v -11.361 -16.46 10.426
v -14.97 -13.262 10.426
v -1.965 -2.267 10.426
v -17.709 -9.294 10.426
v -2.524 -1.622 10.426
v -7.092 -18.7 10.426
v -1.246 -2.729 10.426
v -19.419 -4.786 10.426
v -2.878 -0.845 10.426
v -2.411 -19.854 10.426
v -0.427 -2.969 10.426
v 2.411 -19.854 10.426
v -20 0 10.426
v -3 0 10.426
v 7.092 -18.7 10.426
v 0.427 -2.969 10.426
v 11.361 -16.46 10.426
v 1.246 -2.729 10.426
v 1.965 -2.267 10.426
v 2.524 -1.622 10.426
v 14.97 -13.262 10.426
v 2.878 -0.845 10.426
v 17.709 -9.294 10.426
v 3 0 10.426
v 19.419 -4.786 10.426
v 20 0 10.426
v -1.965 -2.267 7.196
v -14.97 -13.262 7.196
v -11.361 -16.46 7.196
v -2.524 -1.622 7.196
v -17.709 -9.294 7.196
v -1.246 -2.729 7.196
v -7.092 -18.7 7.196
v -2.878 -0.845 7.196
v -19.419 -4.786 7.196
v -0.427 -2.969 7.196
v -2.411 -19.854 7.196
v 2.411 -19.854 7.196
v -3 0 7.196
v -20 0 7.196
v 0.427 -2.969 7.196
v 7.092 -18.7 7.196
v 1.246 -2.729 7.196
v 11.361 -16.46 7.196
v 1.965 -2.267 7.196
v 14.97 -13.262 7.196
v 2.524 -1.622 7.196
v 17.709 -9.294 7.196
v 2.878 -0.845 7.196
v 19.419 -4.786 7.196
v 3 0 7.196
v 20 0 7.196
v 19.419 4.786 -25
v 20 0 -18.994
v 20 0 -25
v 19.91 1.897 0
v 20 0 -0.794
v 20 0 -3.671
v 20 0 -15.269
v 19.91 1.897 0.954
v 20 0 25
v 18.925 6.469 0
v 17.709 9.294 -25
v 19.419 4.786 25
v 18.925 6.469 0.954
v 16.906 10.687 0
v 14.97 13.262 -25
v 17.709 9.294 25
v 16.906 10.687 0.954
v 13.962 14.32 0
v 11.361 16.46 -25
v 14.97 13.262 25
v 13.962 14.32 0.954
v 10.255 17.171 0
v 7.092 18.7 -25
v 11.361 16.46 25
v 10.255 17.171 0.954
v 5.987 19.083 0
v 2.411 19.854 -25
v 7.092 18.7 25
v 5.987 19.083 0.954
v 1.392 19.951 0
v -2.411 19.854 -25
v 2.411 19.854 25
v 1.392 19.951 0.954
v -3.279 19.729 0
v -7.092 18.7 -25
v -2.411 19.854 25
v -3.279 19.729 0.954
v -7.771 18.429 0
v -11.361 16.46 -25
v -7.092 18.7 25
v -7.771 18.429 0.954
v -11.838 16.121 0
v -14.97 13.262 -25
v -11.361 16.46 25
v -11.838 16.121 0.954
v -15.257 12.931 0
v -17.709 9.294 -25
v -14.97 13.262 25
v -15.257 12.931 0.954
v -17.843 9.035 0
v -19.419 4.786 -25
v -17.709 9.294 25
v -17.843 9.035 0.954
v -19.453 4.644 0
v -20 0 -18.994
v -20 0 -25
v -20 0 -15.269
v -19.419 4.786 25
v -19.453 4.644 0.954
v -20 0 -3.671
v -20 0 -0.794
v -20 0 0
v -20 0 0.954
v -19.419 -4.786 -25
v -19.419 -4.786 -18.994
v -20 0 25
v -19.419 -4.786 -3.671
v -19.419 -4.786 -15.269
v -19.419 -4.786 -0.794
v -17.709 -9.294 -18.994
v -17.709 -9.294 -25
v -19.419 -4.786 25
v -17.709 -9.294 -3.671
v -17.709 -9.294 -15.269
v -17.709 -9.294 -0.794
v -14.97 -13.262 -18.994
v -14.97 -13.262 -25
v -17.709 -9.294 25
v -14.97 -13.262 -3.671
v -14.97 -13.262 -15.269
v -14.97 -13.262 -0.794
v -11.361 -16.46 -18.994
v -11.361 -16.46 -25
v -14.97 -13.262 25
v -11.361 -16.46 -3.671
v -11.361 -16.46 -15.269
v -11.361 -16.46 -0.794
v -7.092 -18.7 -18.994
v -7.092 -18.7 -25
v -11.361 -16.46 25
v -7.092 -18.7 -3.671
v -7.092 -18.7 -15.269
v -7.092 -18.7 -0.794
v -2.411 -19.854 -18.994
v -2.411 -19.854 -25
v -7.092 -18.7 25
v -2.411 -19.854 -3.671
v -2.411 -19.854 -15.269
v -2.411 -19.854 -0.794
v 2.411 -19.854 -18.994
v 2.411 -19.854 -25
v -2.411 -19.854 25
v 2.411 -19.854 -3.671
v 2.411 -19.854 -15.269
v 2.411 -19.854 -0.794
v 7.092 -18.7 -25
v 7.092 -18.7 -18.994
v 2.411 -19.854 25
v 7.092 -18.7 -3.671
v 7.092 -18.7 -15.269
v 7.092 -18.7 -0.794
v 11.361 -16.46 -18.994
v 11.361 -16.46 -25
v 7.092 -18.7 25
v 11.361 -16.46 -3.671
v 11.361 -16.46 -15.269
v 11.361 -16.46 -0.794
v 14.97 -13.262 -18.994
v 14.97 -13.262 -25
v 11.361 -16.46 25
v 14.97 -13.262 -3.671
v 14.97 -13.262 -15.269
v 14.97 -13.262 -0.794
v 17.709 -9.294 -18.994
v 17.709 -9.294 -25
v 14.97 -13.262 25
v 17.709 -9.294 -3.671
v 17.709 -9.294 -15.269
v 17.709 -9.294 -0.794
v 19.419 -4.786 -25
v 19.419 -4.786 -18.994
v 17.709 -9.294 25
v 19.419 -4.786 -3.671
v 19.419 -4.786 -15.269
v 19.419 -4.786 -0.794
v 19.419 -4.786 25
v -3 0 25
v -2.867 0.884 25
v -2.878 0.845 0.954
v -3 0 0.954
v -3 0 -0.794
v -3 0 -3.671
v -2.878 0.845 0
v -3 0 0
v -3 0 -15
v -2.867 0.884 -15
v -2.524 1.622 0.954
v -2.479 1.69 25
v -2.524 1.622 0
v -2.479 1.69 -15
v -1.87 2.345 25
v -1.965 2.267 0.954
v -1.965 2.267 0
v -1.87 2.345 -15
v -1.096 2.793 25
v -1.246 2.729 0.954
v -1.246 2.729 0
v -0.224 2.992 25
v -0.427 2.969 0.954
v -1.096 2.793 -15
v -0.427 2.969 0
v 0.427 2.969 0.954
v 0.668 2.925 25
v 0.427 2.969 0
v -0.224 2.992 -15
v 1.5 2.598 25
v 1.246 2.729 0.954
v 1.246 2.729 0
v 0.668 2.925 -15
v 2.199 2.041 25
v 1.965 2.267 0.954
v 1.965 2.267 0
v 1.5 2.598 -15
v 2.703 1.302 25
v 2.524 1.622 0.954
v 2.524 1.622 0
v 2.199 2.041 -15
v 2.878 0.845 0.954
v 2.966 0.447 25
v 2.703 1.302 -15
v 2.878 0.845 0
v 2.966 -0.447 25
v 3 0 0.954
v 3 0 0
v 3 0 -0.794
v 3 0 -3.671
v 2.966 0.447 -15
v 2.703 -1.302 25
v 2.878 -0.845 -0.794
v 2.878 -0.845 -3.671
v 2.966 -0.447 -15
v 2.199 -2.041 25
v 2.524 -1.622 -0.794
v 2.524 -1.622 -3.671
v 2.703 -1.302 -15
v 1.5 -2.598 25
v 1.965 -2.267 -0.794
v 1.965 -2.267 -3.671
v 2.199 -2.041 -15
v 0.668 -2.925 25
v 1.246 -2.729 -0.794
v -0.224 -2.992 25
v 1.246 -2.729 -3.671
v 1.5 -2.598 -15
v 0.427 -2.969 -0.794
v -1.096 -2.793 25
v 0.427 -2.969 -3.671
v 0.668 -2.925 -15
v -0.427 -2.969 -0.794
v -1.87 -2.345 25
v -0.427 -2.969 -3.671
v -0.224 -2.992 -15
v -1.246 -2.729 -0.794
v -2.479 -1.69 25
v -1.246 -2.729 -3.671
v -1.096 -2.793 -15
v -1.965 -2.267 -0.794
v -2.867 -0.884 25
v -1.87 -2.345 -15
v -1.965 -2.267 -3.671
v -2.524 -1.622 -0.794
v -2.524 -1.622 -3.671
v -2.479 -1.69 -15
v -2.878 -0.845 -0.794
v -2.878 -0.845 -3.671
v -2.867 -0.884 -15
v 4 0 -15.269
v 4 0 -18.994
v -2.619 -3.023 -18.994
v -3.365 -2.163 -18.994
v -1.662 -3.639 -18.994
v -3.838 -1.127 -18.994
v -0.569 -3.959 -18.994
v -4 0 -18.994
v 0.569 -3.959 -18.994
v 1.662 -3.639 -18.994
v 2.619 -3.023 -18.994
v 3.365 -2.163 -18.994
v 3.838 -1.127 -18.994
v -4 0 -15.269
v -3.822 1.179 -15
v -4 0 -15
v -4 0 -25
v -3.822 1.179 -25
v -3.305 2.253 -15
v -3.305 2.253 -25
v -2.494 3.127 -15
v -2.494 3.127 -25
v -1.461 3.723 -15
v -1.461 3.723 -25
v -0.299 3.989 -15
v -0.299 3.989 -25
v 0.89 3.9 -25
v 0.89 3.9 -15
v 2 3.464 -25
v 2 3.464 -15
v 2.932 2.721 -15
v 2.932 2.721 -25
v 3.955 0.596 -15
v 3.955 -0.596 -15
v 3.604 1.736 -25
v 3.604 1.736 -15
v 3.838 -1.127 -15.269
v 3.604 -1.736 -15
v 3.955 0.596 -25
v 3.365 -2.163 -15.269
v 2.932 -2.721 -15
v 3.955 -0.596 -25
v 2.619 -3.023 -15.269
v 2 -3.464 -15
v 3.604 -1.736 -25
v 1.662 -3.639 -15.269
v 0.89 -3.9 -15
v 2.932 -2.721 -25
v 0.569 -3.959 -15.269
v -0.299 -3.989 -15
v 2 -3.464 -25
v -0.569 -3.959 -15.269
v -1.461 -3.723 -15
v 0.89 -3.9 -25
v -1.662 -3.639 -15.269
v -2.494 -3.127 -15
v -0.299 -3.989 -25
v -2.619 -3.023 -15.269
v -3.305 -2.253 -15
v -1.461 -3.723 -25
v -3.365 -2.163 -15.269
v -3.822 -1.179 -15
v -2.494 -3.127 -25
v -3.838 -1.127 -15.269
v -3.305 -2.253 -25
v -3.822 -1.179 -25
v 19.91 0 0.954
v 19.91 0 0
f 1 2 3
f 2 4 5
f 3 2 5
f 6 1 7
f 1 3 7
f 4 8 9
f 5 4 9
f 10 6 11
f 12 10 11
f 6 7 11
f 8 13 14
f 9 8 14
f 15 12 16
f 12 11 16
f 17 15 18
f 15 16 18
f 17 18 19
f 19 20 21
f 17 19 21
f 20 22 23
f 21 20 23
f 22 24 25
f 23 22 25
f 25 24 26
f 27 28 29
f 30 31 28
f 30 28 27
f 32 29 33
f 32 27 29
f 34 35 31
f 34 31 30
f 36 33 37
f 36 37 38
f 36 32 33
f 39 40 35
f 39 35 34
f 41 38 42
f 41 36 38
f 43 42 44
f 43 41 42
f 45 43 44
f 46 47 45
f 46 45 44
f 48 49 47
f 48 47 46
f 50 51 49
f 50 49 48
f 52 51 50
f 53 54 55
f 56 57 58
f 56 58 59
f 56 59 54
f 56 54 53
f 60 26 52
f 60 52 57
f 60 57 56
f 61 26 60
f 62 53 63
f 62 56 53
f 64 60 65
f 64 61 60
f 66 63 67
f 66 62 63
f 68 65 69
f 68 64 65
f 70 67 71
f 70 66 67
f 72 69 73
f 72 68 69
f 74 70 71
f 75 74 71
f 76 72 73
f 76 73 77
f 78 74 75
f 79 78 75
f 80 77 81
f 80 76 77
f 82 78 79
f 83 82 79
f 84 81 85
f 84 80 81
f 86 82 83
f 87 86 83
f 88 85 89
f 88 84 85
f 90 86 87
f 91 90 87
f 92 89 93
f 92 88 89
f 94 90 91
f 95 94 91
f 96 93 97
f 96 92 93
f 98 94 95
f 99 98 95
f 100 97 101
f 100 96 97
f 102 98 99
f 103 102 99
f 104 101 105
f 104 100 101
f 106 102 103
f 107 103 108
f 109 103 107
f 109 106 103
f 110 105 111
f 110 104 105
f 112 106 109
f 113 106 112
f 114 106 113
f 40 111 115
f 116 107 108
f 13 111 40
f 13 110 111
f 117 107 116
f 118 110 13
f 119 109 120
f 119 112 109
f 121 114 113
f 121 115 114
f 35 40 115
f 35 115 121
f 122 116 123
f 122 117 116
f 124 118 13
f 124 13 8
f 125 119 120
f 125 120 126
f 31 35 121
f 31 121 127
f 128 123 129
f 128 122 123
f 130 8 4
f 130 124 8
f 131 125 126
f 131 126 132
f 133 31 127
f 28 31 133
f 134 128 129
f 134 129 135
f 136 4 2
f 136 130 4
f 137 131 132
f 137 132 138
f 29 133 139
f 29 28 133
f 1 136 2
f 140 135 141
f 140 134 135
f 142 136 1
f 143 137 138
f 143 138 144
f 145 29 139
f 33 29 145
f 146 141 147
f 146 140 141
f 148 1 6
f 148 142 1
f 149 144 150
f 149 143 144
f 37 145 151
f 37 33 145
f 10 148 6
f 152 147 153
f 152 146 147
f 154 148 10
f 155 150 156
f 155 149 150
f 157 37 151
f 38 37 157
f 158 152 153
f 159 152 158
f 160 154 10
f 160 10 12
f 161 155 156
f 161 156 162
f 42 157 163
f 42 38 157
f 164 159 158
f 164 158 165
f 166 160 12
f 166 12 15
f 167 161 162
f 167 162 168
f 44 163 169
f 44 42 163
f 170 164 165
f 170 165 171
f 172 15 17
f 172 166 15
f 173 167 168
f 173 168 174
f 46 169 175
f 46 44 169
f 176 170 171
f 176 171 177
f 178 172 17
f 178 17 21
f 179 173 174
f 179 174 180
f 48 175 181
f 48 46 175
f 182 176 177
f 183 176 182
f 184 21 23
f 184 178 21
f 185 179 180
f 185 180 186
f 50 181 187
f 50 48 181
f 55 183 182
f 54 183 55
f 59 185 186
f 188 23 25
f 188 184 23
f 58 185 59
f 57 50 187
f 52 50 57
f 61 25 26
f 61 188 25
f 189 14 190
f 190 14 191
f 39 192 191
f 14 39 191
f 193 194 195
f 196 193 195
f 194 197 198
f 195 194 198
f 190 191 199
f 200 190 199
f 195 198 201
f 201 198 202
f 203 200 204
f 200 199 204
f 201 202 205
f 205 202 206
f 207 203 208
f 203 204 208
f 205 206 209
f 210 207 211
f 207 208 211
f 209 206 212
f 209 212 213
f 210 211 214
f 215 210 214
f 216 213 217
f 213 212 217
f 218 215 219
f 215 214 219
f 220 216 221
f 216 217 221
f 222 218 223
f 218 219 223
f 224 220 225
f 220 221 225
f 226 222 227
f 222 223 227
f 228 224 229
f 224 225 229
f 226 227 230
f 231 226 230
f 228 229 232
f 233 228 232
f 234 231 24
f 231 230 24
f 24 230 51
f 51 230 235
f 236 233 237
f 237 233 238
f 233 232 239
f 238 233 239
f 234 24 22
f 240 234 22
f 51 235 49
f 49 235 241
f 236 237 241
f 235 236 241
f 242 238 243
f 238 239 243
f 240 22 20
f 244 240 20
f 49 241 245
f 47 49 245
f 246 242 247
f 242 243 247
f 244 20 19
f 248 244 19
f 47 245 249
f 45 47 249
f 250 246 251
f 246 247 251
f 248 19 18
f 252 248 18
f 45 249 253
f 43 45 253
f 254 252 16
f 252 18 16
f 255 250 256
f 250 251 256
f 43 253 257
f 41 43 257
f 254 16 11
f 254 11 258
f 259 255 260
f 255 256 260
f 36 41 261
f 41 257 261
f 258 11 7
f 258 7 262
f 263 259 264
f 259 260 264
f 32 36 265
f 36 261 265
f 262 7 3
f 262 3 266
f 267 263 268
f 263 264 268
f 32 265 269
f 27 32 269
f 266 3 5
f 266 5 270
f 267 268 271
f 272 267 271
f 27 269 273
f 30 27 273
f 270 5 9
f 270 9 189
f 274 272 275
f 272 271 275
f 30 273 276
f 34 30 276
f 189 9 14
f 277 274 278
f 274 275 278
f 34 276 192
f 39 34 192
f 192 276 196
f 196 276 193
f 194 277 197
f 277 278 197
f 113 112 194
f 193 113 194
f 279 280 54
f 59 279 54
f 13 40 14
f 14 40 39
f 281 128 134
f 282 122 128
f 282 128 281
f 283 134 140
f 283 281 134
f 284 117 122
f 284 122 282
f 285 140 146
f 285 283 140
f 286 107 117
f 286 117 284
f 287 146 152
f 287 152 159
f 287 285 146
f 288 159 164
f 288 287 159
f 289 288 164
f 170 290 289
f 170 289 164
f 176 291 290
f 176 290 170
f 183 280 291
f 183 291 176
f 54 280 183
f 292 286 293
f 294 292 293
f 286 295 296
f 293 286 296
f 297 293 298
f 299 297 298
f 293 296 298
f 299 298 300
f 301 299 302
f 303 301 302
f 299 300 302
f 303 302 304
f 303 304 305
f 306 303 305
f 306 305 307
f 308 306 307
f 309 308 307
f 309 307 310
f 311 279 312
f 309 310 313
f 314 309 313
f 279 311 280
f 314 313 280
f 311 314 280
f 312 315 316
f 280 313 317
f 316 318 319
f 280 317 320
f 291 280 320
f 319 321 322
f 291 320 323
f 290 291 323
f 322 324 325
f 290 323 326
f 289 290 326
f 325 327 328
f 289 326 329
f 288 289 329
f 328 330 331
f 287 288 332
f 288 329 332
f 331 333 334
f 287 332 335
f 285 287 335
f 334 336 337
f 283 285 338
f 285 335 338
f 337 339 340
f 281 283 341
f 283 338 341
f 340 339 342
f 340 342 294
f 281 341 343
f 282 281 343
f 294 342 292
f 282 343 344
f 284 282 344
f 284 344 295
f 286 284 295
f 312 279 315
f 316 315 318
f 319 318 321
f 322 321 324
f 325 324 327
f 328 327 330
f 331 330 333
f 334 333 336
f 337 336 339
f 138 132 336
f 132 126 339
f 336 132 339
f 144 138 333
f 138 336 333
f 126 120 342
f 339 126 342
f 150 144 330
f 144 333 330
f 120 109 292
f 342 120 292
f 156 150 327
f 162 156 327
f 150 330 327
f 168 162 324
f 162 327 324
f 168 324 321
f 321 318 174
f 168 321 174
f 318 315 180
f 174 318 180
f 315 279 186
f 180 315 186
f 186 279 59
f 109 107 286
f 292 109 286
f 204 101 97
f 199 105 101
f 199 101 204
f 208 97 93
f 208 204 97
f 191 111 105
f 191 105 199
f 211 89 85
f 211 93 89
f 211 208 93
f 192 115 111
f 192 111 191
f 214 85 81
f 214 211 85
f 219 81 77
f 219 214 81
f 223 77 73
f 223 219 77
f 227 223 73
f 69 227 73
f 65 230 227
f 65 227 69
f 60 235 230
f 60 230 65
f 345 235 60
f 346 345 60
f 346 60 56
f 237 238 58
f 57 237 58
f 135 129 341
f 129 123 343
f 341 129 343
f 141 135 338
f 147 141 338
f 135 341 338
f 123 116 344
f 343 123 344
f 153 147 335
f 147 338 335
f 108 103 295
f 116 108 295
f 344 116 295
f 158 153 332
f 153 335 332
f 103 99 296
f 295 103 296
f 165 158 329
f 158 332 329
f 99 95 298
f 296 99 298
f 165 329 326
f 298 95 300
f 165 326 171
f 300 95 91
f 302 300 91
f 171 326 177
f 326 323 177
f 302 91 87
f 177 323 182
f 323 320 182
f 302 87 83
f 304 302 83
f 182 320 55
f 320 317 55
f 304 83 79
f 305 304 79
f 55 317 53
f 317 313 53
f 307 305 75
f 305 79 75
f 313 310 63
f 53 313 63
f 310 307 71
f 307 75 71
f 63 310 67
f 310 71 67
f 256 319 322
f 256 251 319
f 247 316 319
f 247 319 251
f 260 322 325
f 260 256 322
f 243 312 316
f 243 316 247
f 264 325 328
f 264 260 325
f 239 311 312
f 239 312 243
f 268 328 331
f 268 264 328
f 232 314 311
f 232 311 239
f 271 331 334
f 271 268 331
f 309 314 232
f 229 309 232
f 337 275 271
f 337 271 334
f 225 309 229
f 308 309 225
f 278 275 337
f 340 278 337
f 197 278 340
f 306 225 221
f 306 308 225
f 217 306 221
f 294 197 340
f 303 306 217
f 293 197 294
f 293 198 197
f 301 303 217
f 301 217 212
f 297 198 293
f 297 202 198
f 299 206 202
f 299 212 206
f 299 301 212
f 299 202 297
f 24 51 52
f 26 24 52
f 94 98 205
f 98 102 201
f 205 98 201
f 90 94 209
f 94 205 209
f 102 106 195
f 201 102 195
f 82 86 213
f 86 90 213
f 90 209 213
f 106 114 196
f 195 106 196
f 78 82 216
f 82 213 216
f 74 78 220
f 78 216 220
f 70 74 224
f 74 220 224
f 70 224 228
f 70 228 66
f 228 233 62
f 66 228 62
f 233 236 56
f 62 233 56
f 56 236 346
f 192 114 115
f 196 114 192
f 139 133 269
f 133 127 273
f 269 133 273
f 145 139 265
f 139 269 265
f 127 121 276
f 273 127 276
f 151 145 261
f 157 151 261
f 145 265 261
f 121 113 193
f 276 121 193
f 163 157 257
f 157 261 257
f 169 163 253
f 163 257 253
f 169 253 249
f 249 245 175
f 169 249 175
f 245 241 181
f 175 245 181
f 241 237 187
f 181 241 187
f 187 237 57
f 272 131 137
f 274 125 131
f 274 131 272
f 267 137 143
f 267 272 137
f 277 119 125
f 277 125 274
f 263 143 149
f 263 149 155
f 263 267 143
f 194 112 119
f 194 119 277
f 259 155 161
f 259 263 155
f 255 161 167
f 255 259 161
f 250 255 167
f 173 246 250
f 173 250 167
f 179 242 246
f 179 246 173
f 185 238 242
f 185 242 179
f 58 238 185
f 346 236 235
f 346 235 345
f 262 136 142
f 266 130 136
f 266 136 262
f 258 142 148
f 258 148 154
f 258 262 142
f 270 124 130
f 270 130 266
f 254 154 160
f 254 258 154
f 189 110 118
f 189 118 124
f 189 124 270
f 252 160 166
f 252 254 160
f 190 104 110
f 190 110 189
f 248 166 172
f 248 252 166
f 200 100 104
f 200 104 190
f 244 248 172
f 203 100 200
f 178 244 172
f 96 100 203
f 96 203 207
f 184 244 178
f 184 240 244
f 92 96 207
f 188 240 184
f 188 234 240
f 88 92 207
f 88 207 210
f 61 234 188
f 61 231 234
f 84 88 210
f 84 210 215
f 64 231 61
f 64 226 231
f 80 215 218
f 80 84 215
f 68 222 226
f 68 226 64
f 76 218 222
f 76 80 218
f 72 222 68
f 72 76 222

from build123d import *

# Parameters (mm, degrees)
SKETCH1_R           = 20
BOSS_EXTRUDE1_DEPTH = 25
CUT_EXTRUDE1_REACH  = 22
SKETCH2_W           = 45.354369025
SKETCH2_H           = 3.724754944
SKETCH2_H_2         = 2.877438925
SKETCH2_H_3         = 3.230053013
CUT_EXTRUDE2_REACH  = 22
SKETCH3_W           = 39.909801602
SKETCH3_H           = 0.954143847
SKETCH4_R           = 3
CUT_EXTRUDE3_DEPTH  = 51
SKETCH5_R           = 4
CUT_EXTRUDE4_DEPTH  = 10


with BuildPart() as part:
    # Sketch1 → Boss-Extrude1 (new body, symmetric)
    with BuildSketch(Plane.XY):
        Circle(SKETCH1_R)
    extrude(amount=BOSS_EXTRUDE1_DEPTH, both=True)

    # Sketch2 → Cut-Extrude1 (cut, up to next)
    with BuildSketch(Plane(origin=(0, 0, 0), x_dir=(1, 0, 0), z_dir=(0, 1, 0)), mode=Mode.PRIVATE) as cut_extrude1_sk1:
        with Locations((0.618163083, 17.131545904)):
            Rectangle(SKETCH2_W, SKETCH2_H)
    cut_extrude1_tool1 = extrude(cut_extrude1_sk1.sketch, amount=-CUT_EXTRUDE1_REACH, mode=Mode.PRIVATE) & part.part
    add(cut_extrude1_tool1.solids().sort_by_distance((0.618163, 0, -17.131546))[0], mode=Mode.SUBTRACT)
    # Sketch2 → Cut-Extrude1 (cut, up to next)
    with BuildSketch(Plane(origin=(0, 0, 0), x_dir=(1, 0, 0), z_dir=(0, 1, 0)), mode=Mode.PRIVATE) as cut_extrude1_sk2:
        with Locations((0.618163083, 2.232701411)):
            Rectangle(SKETCH2_W, SKETCH2_H_2)
    cut_extrude1_tool2 = extrude(cut_extrude1_sk2.sketch, amount=-CUT_EXTRUDE1_REACH, mode=Mode.PRIVATE) & part.part
    add(cut_extrude1_tool2.solids().sort_by_distance((0.618163, 0, -2.232701))[0], mode=Mode.SUBTRACT)
    # Sketch2 → Cut-Extrude1 (cut, up to next)
    with BuildSketch(Plane(origin=(0, 0, 0), x_dir=(1, 0, 0), z_dir=(0, 1, 0)), mode=Mode.PRIVATE) as cut_extrude1_sk3:
        with Locations((0.618163083, -8.81108963)):
            Rectangle(SKETCH2_W, SKETCH2_H_3)
    cut_extrude1_tool3 = extrude(cut_extrude1_sk3.sketch, amount=-CUT_EXTRUDE1_REACH, mode=Mode.PRIVATE) & part.part
    add(cut_extrude1_tool3.solids().sort_by_distance((0.618163, 0, 8.81109))[0], mode=Mode.SUBTRACT)

    # Sketch3 → Cut-Extrude2 (cut, up to next)
    with BuildSketch(Plane(origin=(0, 0, 0), x_dir=(1, 0, 0), z_dir=(0, 1, 0)), mode=Mode.PRIVATE) as cut_extrude2_sk1:
        with Locations((-0.045099199, -0.477071924)):
            Rectangle(SKETCH3_W, SKETCH3_H)
    cut_extrude2_tool1 = extrude(cut_extrude2_sk1.sketch, amount=CUT_EXTRUDE2_REACH, mode=Mode.PRIVATE) & part.part
    add(cut_extrude2_tool1.solids().sort_by_distance((-0.045099, 0, 0.477072))[0], mode=Mode.SUBTRACT)

    # Sketch4 → Cut-Extrude3 (cut, through all)
    with BuildSketch(Plane(origin=(0, 0, -25), x_dir=(-1, 0, 0), z_dir=(0, 0, -1))):
        Circle(SKETCH4_R)
    extrude(amount=-CUT_EXTRUDE3_DEPTH, mode=Mode.SUBTRACT)

    # Sketch5 → Cut-Extrude4 (cut)
    with BuildSketch(Plane(origin=(0, 0, -25), x_dir=(-1, 0, 0), z_dir=(0, 0, -1))):
        Circle(SKETCH5_R)
    extrude(amount=-CUT_EXTRUDE4_DEPTH, mode=Mode.SUBTRACT)


solid = part.part
